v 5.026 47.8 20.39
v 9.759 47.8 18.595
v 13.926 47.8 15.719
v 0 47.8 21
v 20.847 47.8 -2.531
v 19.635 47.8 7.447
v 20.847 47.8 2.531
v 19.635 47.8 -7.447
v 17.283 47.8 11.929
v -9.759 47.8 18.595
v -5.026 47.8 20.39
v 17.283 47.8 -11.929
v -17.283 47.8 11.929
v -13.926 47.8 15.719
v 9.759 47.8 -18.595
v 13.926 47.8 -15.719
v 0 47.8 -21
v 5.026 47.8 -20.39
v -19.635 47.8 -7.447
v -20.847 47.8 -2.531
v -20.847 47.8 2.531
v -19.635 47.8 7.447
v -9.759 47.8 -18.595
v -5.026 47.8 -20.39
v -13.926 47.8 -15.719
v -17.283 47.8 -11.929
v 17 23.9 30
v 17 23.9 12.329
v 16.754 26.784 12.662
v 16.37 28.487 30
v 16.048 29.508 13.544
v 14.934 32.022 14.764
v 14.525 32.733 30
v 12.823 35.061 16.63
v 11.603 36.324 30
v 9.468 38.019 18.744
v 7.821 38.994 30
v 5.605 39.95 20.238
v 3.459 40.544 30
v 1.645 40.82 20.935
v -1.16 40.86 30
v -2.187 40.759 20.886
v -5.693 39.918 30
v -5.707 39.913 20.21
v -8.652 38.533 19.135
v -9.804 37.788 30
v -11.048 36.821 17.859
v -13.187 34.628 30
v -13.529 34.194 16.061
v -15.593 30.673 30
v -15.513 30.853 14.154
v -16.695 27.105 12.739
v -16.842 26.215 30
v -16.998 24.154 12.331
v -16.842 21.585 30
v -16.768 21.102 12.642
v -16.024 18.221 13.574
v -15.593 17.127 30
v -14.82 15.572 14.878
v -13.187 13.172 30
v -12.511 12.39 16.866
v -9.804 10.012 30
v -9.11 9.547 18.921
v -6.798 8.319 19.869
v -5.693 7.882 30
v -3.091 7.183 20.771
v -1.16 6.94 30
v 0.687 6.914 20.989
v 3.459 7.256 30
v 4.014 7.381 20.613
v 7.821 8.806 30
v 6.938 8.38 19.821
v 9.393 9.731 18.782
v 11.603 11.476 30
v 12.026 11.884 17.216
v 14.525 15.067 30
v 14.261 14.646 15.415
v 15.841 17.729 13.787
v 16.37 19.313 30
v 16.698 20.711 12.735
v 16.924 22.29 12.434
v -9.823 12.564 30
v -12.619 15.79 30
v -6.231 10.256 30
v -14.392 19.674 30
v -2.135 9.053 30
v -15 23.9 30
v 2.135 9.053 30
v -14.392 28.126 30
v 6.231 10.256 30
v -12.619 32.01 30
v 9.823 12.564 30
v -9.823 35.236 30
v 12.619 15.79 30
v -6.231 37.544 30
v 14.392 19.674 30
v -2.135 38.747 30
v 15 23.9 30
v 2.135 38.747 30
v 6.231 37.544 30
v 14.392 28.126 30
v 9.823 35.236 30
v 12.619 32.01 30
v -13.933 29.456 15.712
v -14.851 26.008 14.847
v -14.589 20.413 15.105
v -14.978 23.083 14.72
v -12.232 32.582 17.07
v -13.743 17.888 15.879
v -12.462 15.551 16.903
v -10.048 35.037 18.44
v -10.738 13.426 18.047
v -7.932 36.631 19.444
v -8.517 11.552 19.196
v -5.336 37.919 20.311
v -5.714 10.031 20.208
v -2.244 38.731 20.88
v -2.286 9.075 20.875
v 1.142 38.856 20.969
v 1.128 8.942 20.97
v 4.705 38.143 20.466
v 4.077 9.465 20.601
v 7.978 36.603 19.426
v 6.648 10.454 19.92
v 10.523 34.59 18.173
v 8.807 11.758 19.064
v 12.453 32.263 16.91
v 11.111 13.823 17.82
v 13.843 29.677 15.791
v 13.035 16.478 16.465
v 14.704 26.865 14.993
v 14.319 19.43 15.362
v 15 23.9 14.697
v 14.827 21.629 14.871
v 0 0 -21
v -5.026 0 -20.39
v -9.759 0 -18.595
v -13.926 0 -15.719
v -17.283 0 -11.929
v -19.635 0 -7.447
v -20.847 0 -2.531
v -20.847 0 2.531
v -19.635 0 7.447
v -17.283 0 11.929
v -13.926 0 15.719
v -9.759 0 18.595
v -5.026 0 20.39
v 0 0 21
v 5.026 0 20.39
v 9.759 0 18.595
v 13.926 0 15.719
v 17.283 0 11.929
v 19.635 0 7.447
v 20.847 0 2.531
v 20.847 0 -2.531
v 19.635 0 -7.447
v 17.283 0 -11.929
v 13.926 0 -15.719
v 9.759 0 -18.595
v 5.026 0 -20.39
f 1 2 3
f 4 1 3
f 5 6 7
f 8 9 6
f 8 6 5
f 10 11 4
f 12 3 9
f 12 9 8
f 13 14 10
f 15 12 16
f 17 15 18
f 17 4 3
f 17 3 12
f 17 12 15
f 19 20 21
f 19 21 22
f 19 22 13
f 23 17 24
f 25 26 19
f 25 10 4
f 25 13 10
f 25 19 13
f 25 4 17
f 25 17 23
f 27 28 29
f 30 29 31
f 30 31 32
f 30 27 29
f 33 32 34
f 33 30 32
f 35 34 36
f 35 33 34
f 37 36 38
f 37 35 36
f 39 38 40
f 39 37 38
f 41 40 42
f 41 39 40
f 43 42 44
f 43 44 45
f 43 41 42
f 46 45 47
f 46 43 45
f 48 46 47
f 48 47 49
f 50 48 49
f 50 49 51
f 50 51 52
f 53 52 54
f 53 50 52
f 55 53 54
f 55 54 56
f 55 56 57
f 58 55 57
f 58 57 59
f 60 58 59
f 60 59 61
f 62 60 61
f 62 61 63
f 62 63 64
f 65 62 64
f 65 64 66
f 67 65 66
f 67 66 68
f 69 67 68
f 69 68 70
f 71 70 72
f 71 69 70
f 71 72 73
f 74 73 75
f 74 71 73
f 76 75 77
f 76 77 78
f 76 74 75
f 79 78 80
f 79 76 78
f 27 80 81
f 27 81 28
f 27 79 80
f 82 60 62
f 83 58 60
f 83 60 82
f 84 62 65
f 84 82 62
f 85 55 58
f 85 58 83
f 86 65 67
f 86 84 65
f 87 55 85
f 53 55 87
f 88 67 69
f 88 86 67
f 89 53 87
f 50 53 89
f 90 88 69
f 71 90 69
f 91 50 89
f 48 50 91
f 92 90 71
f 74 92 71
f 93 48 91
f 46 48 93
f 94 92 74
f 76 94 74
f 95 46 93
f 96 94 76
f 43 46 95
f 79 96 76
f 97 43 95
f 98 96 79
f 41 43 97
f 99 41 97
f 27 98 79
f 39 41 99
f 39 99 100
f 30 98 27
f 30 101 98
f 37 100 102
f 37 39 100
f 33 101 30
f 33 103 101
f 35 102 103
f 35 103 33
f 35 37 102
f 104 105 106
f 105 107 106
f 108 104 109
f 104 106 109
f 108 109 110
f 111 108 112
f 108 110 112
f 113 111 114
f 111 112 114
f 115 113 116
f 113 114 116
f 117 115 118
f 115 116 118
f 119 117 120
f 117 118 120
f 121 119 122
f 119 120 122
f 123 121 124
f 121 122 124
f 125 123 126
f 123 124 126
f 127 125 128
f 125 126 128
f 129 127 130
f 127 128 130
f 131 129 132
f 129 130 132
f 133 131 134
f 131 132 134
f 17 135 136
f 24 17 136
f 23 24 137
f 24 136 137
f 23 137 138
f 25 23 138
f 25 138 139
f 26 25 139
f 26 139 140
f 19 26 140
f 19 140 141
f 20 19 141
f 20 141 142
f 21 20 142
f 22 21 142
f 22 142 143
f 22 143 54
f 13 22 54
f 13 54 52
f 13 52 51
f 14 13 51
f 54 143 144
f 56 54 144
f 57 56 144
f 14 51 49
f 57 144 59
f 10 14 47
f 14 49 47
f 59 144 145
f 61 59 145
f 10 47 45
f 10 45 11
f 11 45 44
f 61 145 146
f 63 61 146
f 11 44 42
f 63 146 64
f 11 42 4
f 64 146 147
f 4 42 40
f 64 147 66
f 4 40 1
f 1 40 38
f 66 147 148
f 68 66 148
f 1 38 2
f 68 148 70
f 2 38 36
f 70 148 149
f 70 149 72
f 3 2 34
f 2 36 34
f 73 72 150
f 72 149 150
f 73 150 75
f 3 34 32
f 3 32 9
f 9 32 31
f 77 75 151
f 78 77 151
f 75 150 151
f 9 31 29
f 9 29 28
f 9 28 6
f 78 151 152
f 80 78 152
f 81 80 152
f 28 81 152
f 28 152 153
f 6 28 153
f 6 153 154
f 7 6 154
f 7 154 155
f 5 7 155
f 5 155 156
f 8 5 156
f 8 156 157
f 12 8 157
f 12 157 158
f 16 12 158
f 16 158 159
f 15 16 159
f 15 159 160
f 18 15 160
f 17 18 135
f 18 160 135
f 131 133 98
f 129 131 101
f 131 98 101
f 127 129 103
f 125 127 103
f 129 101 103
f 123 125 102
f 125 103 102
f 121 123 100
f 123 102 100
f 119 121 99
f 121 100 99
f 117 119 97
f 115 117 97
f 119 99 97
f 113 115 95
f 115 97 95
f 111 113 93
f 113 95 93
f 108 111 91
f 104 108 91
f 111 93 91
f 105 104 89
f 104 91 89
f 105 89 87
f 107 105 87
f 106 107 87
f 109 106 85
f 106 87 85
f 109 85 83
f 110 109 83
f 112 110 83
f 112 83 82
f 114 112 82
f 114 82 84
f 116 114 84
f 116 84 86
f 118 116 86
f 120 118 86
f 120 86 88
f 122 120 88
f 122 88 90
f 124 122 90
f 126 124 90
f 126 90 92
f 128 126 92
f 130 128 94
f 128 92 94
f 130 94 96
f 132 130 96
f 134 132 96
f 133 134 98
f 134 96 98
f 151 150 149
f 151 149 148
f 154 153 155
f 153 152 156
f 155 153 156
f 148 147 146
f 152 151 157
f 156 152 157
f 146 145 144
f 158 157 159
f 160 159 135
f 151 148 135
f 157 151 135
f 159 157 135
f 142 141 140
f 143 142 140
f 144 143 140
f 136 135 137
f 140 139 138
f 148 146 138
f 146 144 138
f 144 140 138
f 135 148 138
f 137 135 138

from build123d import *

# Parameters (mm, degrees)
SKETCH1_R                = 21
BOSS_EXTRUDE1_DEPTH      = 47.8
BOSS_EXTRUDE2_REACH      = 74.985
BOSS_EXTRUDE2_END_RADIUS = 21
SKETCH3_R                = 17
SKETCH3_R_2              = 15


with BuildPart() as part:
    # Sketch1 → Boss-Extrude1 (new body)
    with BuildSketch(Plane(origin=(0, 0, 0), x_dir=(1, 0, 0), z_dir=(0, 1, 0))):
        with Locations(Location((0, 0, 0), (0, 0, 90))):
            Circle(SKETCH1_R)
    extrude(amount=BOSS_EXTRUDE1_DEPTH)

    # Boss-Extrude2: up to this cylinder (the profile starts outside it)
    boss_extrude2_end = Plane(origin=(0, 23.9, 0), z_dir=(0, -1, 0)) * Cylinder(BOSS_EXTRUDE2_END_RADIUS, 192.97, mode=Mode.PRIVATE)
    # Sketch3 → Boss-Extrude2 (add, up to the surface)
    with BuildSketch(Plane.XY.offset(30), mode=Mode.PRIVATE) as boss_extrude2_sk1:
        with Locations((0, 23.9)):
            Circle(SKETCH3_R)
        with Locations((0, 23.9)):
            Circle(SKETCH3_R_2, mode=Mode.SUBTRACT)
    boss_extrude2_tool1 = extrude(boss_extrude2_sk1.sketch, amount=-BOSS_EXTRUDE2_REACH, mode=Mode.PRIVATE) - boss_extrude2_end
    add(boss_extrude2_tool1.solids().sort_by_distance((-16.519167, 23.9, 30))[0])


solid = part.part
